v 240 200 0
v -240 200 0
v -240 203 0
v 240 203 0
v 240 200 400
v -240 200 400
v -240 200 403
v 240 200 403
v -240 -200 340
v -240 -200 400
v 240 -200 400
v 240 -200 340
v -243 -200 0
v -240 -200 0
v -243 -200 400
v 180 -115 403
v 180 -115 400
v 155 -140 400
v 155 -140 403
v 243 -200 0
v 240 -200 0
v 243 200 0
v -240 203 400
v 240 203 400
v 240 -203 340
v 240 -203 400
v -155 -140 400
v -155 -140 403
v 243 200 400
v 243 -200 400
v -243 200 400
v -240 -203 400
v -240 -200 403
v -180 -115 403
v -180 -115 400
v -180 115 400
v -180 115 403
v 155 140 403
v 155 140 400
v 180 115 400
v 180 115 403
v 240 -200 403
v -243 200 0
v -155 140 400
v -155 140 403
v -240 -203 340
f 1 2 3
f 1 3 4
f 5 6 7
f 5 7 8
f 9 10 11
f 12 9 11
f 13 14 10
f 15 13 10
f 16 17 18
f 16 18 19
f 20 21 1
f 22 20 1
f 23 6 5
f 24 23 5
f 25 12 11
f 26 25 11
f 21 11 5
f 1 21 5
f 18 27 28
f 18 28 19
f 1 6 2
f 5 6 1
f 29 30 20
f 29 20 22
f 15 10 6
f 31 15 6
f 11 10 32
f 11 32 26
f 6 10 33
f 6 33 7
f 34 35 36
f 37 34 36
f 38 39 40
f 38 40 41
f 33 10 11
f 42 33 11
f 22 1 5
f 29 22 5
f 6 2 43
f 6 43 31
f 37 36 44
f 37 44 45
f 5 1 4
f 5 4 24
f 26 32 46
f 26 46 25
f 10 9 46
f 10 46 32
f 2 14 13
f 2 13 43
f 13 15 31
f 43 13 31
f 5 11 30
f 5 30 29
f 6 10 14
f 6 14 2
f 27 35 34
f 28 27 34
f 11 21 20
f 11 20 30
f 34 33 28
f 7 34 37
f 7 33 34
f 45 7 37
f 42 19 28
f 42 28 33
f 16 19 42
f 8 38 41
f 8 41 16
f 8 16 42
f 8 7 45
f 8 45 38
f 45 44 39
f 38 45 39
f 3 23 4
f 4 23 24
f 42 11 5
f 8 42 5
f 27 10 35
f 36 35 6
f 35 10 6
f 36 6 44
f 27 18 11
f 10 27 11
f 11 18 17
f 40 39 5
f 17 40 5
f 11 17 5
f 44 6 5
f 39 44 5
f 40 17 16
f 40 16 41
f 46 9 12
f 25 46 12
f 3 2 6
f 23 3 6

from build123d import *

# Parameters (mm, degrees)
F4_W      = 480
F4_H      = 400
F4_W_2    = 360
F4_H_2    = 280
F13_DEPTH = 3
F14_SIZE  = 25
F6_W      = 400
F6_H      = 400
F15_DEPTH = 3
F10_W     = 400
F10_H     = 400
F16_DEPTH = 3
F8_W      = 480
F8_H      = 400
F17_DEPTH = 3
F12_W     = 480
F12_H     = 60
F18_DEPTH = 3


with BuildPart() as f13:
    # F4 (on plane+point) → F13 (new body)
    with BuildSketch(Plane.XY.offset(400)):
        Rectangle(F4_W, F4_H)
        Rectangle(F4_W_2, F4_H_2, mode=Mode.SUBTRACT)
    extrude(amount=F13_DEPTH)

    # F14
    f14_edges = [f13.edges().sort_by_distance(p)[0] for p in [
        (-180, -140, 401.5),
        (-180, 140, 401.5),
        (180, 140, 401.5),
        (180, -140, 401.5),
    ]]
    chamfer(f14_edges, length=F14_SIZE)


with BuildPart() as f15:
    # F6 (on plane+point) → F15 (new body)
    with BuildSketch(Plane.YZ.offset(-240)):
        with Locations((0, 200)):
            Rectangle(F6_W, F6_H)
    extrude(amount=-F15_DEPTH)


with BuildPart() as f16:
    # F10 (on plane+point) → F16 (new body)
    with BuildSketch(Plane.YZ.offset(240)):
        with Locations((0, 200)):
            Rectangle(F10_W, F10_H)
    extrude(amount=F16_DEPTH)


with BuildPart() as f17:
    # F8 (on plane+point) → F17 (new body)
    with BuildSketch(Plane.XZ.offset(-200)):
        with Locations((0, 200)):
            Rectangle(F8_W, F8_H)
    extrude(amount=-F17_DEPTH)


with BuildPart() as f18:
    # F12 (on plane+point) → F18 (new body)
    with BuildSketch(Plane.XZ.offset(200)):
        with Locations((0, 370)):
            Rectangle(F12_W, F12_H)
    extrude(amount=F18_DEPTH)


solid = Compound([f13.part, f15.part, f16.part, f17.part, f18.part])
